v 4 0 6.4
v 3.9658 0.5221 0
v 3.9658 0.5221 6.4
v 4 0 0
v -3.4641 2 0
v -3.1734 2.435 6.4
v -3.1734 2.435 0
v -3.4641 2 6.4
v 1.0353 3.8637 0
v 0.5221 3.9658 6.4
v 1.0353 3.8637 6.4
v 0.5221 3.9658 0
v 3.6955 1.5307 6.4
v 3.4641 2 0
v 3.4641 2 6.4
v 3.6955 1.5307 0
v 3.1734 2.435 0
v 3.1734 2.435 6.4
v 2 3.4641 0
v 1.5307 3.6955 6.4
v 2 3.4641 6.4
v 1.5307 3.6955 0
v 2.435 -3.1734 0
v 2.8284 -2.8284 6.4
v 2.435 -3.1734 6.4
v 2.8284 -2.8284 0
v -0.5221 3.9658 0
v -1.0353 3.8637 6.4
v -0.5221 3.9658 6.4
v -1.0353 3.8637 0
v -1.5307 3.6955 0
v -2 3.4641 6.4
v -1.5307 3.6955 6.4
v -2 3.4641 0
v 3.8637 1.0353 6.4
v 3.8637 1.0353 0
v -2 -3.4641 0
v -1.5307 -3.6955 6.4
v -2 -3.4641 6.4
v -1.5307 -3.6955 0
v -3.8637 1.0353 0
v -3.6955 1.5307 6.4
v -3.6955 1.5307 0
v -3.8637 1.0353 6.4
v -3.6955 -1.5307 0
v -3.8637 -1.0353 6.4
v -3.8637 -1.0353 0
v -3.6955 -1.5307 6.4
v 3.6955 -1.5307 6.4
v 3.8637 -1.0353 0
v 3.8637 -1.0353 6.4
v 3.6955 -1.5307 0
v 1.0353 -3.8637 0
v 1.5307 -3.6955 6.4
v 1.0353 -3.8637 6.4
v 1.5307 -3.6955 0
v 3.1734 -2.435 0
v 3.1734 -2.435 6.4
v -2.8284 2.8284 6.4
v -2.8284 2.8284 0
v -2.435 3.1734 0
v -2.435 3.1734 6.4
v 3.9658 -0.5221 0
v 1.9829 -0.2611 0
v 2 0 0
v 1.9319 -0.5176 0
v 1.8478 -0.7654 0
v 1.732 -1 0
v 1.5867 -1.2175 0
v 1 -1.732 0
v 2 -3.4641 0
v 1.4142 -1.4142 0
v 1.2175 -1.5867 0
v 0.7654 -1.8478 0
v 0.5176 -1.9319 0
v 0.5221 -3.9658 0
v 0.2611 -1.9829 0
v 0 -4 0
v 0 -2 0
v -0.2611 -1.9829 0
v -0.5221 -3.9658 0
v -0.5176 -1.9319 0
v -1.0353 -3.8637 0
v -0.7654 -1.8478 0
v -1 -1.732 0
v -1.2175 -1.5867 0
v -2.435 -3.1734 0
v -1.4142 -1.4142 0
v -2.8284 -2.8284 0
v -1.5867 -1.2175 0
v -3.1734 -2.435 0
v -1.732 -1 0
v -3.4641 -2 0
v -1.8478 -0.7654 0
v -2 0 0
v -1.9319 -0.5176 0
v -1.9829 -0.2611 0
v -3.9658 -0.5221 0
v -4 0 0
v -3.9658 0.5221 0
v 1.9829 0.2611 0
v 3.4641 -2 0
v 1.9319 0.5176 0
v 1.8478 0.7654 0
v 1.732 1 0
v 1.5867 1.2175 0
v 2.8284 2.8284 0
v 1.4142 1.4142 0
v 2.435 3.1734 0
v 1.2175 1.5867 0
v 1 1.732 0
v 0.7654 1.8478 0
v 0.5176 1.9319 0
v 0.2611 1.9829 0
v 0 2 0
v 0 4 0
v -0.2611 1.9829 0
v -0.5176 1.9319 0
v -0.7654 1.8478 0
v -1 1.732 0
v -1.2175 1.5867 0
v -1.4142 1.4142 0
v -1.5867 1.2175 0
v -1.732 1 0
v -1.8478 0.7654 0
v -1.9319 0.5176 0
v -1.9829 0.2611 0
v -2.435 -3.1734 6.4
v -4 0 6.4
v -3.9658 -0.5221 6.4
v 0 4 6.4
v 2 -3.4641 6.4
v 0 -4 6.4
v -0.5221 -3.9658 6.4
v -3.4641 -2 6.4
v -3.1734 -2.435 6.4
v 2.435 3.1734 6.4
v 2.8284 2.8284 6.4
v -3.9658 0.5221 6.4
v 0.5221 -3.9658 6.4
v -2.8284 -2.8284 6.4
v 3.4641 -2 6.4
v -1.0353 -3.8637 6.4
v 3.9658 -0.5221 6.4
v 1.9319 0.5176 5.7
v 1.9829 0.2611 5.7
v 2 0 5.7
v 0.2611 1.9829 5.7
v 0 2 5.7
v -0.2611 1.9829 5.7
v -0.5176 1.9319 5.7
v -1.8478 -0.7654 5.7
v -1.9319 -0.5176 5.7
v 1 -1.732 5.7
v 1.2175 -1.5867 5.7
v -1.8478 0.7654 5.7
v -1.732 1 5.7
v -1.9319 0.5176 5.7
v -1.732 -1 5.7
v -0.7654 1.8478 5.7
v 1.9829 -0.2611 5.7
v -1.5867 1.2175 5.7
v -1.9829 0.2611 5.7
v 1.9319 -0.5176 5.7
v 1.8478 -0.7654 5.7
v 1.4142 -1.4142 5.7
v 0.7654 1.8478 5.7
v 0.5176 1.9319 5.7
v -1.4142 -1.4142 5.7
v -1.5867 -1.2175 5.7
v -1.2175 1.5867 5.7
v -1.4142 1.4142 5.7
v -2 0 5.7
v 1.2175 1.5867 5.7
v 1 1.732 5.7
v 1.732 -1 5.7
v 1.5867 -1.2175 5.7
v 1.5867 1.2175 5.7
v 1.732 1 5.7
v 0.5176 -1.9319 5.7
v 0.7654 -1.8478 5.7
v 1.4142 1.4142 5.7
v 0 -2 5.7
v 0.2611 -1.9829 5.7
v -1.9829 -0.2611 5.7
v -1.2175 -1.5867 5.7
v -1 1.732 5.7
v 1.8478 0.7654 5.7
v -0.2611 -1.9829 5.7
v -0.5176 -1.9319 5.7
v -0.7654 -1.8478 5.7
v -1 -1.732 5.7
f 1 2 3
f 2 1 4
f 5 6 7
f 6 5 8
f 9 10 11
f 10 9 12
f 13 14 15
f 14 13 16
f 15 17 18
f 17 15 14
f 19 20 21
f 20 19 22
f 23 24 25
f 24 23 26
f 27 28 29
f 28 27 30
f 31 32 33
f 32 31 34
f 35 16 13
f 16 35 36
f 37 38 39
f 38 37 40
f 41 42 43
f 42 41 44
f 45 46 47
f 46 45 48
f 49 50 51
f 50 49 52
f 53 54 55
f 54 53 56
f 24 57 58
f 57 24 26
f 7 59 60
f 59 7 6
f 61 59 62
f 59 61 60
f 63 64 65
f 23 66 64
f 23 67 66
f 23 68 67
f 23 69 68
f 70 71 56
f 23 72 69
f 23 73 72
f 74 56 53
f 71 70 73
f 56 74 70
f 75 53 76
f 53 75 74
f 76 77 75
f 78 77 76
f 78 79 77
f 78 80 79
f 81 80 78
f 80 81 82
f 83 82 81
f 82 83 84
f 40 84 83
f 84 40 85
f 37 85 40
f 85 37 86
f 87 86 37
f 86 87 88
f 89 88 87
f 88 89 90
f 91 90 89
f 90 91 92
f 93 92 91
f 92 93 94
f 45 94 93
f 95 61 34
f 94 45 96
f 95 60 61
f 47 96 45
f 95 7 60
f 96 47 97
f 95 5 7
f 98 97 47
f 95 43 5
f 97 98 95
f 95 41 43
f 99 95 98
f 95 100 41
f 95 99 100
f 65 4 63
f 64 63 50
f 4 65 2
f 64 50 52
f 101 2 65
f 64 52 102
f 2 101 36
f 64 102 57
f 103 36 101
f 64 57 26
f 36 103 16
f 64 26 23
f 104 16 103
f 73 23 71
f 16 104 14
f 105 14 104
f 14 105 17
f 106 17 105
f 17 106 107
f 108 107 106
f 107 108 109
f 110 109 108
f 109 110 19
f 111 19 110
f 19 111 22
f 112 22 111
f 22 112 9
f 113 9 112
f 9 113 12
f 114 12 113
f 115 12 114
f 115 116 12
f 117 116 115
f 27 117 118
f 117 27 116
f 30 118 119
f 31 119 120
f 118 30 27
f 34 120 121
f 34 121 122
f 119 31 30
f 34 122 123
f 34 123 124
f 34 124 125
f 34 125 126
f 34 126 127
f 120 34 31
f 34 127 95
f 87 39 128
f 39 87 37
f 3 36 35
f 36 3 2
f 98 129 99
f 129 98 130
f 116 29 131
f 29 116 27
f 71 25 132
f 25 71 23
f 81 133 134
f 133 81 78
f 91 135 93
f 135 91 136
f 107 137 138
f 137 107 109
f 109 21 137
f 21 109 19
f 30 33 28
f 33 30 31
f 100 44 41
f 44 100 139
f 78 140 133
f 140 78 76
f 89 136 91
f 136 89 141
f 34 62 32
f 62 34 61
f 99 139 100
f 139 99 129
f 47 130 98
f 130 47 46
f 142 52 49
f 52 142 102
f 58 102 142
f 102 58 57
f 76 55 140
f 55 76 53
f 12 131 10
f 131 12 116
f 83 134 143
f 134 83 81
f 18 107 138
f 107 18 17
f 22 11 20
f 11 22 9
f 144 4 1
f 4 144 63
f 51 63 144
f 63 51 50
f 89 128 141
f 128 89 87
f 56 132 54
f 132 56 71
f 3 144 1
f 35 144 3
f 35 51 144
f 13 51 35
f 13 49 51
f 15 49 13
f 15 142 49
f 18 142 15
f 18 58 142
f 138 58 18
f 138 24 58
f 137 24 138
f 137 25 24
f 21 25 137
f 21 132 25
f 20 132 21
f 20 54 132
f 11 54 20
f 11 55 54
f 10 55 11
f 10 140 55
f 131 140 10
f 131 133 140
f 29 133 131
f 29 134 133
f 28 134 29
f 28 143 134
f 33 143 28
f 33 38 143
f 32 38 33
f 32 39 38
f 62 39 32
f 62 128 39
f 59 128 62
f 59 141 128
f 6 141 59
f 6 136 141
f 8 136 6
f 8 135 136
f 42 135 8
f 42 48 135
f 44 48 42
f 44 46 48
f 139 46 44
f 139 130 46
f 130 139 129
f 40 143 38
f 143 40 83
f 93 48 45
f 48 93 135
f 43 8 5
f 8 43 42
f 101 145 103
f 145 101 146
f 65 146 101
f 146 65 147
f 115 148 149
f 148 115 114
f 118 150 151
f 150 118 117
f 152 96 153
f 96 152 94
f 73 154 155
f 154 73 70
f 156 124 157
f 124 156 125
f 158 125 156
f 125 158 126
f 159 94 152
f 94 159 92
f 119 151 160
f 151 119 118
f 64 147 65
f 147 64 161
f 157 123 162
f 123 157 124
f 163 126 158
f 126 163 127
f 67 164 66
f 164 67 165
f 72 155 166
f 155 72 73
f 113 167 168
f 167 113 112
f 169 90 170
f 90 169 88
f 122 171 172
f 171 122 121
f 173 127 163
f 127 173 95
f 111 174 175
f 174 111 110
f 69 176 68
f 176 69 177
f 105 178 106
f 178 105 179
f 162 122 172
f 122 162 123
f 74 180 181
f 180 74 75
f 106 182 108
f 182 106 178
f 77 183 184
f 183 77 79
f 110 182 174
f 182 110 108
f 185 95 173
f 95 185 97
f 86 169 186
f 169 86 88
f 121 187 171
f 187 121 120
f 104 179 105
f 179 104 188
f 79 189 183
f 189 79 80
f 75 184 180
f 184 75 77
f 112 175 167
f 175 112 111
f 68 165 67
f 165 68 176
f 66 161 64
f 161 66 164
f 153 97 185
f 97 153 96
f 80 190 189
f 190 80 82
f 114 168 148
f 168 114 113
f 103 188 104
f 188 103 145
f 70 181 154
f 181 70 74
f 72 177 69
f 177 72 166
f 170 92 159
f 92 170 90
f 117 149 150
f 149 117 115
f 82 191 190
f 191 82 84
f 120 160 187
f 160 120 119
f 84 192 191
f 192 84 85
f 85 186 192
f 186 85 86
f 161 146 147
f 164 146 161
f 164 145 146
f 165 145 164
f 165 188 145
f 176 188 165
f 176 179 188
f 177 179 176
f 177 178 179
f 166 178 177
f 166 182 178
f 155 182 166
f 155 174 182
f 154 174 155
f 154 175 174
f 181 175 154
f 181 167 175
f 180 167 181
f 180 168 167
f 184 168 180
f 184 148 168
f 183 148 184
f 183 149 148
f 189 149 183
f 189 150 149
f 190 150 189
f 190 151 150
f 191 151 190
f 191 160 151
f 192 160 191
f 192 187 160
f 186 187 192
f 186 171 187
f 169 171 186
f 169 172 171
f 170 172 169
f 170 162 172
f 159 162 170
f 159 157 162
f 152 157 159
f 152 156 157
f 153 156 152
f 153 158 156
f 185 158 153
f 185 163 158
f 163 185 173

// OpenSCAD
// Heat-set insert boss — millimetres. Default fastening is heat-set, not printed thread.
// Dimensions: skills/3d-print-openscad/references/heat-set-inserts-fdm.md
// Tag PRINT_SPEC source: datasheet or measured. Assumed insert OD cannot ship
// on fit.required parts.

insert_od_mm = 4.6;          // M3 class major OD, datasheet
insert_hole_d_mm = 4.0;      // recommended FDM hole
insert_depth_mm = 5.7;
boss_od_mm = 8.0;
boss_h_mm = 6.4;
$fn = 48;
eps = 0.02;

module insert_boss() {
  difference() {
    cylinder(d = boss_od_mm, h = boss_h_mm);
    translate([0, 0, -eps])
      cylinder(d = insert_hole_d_mm, h = insert_depth_mm + eps);
  }
}

insert_boss();
